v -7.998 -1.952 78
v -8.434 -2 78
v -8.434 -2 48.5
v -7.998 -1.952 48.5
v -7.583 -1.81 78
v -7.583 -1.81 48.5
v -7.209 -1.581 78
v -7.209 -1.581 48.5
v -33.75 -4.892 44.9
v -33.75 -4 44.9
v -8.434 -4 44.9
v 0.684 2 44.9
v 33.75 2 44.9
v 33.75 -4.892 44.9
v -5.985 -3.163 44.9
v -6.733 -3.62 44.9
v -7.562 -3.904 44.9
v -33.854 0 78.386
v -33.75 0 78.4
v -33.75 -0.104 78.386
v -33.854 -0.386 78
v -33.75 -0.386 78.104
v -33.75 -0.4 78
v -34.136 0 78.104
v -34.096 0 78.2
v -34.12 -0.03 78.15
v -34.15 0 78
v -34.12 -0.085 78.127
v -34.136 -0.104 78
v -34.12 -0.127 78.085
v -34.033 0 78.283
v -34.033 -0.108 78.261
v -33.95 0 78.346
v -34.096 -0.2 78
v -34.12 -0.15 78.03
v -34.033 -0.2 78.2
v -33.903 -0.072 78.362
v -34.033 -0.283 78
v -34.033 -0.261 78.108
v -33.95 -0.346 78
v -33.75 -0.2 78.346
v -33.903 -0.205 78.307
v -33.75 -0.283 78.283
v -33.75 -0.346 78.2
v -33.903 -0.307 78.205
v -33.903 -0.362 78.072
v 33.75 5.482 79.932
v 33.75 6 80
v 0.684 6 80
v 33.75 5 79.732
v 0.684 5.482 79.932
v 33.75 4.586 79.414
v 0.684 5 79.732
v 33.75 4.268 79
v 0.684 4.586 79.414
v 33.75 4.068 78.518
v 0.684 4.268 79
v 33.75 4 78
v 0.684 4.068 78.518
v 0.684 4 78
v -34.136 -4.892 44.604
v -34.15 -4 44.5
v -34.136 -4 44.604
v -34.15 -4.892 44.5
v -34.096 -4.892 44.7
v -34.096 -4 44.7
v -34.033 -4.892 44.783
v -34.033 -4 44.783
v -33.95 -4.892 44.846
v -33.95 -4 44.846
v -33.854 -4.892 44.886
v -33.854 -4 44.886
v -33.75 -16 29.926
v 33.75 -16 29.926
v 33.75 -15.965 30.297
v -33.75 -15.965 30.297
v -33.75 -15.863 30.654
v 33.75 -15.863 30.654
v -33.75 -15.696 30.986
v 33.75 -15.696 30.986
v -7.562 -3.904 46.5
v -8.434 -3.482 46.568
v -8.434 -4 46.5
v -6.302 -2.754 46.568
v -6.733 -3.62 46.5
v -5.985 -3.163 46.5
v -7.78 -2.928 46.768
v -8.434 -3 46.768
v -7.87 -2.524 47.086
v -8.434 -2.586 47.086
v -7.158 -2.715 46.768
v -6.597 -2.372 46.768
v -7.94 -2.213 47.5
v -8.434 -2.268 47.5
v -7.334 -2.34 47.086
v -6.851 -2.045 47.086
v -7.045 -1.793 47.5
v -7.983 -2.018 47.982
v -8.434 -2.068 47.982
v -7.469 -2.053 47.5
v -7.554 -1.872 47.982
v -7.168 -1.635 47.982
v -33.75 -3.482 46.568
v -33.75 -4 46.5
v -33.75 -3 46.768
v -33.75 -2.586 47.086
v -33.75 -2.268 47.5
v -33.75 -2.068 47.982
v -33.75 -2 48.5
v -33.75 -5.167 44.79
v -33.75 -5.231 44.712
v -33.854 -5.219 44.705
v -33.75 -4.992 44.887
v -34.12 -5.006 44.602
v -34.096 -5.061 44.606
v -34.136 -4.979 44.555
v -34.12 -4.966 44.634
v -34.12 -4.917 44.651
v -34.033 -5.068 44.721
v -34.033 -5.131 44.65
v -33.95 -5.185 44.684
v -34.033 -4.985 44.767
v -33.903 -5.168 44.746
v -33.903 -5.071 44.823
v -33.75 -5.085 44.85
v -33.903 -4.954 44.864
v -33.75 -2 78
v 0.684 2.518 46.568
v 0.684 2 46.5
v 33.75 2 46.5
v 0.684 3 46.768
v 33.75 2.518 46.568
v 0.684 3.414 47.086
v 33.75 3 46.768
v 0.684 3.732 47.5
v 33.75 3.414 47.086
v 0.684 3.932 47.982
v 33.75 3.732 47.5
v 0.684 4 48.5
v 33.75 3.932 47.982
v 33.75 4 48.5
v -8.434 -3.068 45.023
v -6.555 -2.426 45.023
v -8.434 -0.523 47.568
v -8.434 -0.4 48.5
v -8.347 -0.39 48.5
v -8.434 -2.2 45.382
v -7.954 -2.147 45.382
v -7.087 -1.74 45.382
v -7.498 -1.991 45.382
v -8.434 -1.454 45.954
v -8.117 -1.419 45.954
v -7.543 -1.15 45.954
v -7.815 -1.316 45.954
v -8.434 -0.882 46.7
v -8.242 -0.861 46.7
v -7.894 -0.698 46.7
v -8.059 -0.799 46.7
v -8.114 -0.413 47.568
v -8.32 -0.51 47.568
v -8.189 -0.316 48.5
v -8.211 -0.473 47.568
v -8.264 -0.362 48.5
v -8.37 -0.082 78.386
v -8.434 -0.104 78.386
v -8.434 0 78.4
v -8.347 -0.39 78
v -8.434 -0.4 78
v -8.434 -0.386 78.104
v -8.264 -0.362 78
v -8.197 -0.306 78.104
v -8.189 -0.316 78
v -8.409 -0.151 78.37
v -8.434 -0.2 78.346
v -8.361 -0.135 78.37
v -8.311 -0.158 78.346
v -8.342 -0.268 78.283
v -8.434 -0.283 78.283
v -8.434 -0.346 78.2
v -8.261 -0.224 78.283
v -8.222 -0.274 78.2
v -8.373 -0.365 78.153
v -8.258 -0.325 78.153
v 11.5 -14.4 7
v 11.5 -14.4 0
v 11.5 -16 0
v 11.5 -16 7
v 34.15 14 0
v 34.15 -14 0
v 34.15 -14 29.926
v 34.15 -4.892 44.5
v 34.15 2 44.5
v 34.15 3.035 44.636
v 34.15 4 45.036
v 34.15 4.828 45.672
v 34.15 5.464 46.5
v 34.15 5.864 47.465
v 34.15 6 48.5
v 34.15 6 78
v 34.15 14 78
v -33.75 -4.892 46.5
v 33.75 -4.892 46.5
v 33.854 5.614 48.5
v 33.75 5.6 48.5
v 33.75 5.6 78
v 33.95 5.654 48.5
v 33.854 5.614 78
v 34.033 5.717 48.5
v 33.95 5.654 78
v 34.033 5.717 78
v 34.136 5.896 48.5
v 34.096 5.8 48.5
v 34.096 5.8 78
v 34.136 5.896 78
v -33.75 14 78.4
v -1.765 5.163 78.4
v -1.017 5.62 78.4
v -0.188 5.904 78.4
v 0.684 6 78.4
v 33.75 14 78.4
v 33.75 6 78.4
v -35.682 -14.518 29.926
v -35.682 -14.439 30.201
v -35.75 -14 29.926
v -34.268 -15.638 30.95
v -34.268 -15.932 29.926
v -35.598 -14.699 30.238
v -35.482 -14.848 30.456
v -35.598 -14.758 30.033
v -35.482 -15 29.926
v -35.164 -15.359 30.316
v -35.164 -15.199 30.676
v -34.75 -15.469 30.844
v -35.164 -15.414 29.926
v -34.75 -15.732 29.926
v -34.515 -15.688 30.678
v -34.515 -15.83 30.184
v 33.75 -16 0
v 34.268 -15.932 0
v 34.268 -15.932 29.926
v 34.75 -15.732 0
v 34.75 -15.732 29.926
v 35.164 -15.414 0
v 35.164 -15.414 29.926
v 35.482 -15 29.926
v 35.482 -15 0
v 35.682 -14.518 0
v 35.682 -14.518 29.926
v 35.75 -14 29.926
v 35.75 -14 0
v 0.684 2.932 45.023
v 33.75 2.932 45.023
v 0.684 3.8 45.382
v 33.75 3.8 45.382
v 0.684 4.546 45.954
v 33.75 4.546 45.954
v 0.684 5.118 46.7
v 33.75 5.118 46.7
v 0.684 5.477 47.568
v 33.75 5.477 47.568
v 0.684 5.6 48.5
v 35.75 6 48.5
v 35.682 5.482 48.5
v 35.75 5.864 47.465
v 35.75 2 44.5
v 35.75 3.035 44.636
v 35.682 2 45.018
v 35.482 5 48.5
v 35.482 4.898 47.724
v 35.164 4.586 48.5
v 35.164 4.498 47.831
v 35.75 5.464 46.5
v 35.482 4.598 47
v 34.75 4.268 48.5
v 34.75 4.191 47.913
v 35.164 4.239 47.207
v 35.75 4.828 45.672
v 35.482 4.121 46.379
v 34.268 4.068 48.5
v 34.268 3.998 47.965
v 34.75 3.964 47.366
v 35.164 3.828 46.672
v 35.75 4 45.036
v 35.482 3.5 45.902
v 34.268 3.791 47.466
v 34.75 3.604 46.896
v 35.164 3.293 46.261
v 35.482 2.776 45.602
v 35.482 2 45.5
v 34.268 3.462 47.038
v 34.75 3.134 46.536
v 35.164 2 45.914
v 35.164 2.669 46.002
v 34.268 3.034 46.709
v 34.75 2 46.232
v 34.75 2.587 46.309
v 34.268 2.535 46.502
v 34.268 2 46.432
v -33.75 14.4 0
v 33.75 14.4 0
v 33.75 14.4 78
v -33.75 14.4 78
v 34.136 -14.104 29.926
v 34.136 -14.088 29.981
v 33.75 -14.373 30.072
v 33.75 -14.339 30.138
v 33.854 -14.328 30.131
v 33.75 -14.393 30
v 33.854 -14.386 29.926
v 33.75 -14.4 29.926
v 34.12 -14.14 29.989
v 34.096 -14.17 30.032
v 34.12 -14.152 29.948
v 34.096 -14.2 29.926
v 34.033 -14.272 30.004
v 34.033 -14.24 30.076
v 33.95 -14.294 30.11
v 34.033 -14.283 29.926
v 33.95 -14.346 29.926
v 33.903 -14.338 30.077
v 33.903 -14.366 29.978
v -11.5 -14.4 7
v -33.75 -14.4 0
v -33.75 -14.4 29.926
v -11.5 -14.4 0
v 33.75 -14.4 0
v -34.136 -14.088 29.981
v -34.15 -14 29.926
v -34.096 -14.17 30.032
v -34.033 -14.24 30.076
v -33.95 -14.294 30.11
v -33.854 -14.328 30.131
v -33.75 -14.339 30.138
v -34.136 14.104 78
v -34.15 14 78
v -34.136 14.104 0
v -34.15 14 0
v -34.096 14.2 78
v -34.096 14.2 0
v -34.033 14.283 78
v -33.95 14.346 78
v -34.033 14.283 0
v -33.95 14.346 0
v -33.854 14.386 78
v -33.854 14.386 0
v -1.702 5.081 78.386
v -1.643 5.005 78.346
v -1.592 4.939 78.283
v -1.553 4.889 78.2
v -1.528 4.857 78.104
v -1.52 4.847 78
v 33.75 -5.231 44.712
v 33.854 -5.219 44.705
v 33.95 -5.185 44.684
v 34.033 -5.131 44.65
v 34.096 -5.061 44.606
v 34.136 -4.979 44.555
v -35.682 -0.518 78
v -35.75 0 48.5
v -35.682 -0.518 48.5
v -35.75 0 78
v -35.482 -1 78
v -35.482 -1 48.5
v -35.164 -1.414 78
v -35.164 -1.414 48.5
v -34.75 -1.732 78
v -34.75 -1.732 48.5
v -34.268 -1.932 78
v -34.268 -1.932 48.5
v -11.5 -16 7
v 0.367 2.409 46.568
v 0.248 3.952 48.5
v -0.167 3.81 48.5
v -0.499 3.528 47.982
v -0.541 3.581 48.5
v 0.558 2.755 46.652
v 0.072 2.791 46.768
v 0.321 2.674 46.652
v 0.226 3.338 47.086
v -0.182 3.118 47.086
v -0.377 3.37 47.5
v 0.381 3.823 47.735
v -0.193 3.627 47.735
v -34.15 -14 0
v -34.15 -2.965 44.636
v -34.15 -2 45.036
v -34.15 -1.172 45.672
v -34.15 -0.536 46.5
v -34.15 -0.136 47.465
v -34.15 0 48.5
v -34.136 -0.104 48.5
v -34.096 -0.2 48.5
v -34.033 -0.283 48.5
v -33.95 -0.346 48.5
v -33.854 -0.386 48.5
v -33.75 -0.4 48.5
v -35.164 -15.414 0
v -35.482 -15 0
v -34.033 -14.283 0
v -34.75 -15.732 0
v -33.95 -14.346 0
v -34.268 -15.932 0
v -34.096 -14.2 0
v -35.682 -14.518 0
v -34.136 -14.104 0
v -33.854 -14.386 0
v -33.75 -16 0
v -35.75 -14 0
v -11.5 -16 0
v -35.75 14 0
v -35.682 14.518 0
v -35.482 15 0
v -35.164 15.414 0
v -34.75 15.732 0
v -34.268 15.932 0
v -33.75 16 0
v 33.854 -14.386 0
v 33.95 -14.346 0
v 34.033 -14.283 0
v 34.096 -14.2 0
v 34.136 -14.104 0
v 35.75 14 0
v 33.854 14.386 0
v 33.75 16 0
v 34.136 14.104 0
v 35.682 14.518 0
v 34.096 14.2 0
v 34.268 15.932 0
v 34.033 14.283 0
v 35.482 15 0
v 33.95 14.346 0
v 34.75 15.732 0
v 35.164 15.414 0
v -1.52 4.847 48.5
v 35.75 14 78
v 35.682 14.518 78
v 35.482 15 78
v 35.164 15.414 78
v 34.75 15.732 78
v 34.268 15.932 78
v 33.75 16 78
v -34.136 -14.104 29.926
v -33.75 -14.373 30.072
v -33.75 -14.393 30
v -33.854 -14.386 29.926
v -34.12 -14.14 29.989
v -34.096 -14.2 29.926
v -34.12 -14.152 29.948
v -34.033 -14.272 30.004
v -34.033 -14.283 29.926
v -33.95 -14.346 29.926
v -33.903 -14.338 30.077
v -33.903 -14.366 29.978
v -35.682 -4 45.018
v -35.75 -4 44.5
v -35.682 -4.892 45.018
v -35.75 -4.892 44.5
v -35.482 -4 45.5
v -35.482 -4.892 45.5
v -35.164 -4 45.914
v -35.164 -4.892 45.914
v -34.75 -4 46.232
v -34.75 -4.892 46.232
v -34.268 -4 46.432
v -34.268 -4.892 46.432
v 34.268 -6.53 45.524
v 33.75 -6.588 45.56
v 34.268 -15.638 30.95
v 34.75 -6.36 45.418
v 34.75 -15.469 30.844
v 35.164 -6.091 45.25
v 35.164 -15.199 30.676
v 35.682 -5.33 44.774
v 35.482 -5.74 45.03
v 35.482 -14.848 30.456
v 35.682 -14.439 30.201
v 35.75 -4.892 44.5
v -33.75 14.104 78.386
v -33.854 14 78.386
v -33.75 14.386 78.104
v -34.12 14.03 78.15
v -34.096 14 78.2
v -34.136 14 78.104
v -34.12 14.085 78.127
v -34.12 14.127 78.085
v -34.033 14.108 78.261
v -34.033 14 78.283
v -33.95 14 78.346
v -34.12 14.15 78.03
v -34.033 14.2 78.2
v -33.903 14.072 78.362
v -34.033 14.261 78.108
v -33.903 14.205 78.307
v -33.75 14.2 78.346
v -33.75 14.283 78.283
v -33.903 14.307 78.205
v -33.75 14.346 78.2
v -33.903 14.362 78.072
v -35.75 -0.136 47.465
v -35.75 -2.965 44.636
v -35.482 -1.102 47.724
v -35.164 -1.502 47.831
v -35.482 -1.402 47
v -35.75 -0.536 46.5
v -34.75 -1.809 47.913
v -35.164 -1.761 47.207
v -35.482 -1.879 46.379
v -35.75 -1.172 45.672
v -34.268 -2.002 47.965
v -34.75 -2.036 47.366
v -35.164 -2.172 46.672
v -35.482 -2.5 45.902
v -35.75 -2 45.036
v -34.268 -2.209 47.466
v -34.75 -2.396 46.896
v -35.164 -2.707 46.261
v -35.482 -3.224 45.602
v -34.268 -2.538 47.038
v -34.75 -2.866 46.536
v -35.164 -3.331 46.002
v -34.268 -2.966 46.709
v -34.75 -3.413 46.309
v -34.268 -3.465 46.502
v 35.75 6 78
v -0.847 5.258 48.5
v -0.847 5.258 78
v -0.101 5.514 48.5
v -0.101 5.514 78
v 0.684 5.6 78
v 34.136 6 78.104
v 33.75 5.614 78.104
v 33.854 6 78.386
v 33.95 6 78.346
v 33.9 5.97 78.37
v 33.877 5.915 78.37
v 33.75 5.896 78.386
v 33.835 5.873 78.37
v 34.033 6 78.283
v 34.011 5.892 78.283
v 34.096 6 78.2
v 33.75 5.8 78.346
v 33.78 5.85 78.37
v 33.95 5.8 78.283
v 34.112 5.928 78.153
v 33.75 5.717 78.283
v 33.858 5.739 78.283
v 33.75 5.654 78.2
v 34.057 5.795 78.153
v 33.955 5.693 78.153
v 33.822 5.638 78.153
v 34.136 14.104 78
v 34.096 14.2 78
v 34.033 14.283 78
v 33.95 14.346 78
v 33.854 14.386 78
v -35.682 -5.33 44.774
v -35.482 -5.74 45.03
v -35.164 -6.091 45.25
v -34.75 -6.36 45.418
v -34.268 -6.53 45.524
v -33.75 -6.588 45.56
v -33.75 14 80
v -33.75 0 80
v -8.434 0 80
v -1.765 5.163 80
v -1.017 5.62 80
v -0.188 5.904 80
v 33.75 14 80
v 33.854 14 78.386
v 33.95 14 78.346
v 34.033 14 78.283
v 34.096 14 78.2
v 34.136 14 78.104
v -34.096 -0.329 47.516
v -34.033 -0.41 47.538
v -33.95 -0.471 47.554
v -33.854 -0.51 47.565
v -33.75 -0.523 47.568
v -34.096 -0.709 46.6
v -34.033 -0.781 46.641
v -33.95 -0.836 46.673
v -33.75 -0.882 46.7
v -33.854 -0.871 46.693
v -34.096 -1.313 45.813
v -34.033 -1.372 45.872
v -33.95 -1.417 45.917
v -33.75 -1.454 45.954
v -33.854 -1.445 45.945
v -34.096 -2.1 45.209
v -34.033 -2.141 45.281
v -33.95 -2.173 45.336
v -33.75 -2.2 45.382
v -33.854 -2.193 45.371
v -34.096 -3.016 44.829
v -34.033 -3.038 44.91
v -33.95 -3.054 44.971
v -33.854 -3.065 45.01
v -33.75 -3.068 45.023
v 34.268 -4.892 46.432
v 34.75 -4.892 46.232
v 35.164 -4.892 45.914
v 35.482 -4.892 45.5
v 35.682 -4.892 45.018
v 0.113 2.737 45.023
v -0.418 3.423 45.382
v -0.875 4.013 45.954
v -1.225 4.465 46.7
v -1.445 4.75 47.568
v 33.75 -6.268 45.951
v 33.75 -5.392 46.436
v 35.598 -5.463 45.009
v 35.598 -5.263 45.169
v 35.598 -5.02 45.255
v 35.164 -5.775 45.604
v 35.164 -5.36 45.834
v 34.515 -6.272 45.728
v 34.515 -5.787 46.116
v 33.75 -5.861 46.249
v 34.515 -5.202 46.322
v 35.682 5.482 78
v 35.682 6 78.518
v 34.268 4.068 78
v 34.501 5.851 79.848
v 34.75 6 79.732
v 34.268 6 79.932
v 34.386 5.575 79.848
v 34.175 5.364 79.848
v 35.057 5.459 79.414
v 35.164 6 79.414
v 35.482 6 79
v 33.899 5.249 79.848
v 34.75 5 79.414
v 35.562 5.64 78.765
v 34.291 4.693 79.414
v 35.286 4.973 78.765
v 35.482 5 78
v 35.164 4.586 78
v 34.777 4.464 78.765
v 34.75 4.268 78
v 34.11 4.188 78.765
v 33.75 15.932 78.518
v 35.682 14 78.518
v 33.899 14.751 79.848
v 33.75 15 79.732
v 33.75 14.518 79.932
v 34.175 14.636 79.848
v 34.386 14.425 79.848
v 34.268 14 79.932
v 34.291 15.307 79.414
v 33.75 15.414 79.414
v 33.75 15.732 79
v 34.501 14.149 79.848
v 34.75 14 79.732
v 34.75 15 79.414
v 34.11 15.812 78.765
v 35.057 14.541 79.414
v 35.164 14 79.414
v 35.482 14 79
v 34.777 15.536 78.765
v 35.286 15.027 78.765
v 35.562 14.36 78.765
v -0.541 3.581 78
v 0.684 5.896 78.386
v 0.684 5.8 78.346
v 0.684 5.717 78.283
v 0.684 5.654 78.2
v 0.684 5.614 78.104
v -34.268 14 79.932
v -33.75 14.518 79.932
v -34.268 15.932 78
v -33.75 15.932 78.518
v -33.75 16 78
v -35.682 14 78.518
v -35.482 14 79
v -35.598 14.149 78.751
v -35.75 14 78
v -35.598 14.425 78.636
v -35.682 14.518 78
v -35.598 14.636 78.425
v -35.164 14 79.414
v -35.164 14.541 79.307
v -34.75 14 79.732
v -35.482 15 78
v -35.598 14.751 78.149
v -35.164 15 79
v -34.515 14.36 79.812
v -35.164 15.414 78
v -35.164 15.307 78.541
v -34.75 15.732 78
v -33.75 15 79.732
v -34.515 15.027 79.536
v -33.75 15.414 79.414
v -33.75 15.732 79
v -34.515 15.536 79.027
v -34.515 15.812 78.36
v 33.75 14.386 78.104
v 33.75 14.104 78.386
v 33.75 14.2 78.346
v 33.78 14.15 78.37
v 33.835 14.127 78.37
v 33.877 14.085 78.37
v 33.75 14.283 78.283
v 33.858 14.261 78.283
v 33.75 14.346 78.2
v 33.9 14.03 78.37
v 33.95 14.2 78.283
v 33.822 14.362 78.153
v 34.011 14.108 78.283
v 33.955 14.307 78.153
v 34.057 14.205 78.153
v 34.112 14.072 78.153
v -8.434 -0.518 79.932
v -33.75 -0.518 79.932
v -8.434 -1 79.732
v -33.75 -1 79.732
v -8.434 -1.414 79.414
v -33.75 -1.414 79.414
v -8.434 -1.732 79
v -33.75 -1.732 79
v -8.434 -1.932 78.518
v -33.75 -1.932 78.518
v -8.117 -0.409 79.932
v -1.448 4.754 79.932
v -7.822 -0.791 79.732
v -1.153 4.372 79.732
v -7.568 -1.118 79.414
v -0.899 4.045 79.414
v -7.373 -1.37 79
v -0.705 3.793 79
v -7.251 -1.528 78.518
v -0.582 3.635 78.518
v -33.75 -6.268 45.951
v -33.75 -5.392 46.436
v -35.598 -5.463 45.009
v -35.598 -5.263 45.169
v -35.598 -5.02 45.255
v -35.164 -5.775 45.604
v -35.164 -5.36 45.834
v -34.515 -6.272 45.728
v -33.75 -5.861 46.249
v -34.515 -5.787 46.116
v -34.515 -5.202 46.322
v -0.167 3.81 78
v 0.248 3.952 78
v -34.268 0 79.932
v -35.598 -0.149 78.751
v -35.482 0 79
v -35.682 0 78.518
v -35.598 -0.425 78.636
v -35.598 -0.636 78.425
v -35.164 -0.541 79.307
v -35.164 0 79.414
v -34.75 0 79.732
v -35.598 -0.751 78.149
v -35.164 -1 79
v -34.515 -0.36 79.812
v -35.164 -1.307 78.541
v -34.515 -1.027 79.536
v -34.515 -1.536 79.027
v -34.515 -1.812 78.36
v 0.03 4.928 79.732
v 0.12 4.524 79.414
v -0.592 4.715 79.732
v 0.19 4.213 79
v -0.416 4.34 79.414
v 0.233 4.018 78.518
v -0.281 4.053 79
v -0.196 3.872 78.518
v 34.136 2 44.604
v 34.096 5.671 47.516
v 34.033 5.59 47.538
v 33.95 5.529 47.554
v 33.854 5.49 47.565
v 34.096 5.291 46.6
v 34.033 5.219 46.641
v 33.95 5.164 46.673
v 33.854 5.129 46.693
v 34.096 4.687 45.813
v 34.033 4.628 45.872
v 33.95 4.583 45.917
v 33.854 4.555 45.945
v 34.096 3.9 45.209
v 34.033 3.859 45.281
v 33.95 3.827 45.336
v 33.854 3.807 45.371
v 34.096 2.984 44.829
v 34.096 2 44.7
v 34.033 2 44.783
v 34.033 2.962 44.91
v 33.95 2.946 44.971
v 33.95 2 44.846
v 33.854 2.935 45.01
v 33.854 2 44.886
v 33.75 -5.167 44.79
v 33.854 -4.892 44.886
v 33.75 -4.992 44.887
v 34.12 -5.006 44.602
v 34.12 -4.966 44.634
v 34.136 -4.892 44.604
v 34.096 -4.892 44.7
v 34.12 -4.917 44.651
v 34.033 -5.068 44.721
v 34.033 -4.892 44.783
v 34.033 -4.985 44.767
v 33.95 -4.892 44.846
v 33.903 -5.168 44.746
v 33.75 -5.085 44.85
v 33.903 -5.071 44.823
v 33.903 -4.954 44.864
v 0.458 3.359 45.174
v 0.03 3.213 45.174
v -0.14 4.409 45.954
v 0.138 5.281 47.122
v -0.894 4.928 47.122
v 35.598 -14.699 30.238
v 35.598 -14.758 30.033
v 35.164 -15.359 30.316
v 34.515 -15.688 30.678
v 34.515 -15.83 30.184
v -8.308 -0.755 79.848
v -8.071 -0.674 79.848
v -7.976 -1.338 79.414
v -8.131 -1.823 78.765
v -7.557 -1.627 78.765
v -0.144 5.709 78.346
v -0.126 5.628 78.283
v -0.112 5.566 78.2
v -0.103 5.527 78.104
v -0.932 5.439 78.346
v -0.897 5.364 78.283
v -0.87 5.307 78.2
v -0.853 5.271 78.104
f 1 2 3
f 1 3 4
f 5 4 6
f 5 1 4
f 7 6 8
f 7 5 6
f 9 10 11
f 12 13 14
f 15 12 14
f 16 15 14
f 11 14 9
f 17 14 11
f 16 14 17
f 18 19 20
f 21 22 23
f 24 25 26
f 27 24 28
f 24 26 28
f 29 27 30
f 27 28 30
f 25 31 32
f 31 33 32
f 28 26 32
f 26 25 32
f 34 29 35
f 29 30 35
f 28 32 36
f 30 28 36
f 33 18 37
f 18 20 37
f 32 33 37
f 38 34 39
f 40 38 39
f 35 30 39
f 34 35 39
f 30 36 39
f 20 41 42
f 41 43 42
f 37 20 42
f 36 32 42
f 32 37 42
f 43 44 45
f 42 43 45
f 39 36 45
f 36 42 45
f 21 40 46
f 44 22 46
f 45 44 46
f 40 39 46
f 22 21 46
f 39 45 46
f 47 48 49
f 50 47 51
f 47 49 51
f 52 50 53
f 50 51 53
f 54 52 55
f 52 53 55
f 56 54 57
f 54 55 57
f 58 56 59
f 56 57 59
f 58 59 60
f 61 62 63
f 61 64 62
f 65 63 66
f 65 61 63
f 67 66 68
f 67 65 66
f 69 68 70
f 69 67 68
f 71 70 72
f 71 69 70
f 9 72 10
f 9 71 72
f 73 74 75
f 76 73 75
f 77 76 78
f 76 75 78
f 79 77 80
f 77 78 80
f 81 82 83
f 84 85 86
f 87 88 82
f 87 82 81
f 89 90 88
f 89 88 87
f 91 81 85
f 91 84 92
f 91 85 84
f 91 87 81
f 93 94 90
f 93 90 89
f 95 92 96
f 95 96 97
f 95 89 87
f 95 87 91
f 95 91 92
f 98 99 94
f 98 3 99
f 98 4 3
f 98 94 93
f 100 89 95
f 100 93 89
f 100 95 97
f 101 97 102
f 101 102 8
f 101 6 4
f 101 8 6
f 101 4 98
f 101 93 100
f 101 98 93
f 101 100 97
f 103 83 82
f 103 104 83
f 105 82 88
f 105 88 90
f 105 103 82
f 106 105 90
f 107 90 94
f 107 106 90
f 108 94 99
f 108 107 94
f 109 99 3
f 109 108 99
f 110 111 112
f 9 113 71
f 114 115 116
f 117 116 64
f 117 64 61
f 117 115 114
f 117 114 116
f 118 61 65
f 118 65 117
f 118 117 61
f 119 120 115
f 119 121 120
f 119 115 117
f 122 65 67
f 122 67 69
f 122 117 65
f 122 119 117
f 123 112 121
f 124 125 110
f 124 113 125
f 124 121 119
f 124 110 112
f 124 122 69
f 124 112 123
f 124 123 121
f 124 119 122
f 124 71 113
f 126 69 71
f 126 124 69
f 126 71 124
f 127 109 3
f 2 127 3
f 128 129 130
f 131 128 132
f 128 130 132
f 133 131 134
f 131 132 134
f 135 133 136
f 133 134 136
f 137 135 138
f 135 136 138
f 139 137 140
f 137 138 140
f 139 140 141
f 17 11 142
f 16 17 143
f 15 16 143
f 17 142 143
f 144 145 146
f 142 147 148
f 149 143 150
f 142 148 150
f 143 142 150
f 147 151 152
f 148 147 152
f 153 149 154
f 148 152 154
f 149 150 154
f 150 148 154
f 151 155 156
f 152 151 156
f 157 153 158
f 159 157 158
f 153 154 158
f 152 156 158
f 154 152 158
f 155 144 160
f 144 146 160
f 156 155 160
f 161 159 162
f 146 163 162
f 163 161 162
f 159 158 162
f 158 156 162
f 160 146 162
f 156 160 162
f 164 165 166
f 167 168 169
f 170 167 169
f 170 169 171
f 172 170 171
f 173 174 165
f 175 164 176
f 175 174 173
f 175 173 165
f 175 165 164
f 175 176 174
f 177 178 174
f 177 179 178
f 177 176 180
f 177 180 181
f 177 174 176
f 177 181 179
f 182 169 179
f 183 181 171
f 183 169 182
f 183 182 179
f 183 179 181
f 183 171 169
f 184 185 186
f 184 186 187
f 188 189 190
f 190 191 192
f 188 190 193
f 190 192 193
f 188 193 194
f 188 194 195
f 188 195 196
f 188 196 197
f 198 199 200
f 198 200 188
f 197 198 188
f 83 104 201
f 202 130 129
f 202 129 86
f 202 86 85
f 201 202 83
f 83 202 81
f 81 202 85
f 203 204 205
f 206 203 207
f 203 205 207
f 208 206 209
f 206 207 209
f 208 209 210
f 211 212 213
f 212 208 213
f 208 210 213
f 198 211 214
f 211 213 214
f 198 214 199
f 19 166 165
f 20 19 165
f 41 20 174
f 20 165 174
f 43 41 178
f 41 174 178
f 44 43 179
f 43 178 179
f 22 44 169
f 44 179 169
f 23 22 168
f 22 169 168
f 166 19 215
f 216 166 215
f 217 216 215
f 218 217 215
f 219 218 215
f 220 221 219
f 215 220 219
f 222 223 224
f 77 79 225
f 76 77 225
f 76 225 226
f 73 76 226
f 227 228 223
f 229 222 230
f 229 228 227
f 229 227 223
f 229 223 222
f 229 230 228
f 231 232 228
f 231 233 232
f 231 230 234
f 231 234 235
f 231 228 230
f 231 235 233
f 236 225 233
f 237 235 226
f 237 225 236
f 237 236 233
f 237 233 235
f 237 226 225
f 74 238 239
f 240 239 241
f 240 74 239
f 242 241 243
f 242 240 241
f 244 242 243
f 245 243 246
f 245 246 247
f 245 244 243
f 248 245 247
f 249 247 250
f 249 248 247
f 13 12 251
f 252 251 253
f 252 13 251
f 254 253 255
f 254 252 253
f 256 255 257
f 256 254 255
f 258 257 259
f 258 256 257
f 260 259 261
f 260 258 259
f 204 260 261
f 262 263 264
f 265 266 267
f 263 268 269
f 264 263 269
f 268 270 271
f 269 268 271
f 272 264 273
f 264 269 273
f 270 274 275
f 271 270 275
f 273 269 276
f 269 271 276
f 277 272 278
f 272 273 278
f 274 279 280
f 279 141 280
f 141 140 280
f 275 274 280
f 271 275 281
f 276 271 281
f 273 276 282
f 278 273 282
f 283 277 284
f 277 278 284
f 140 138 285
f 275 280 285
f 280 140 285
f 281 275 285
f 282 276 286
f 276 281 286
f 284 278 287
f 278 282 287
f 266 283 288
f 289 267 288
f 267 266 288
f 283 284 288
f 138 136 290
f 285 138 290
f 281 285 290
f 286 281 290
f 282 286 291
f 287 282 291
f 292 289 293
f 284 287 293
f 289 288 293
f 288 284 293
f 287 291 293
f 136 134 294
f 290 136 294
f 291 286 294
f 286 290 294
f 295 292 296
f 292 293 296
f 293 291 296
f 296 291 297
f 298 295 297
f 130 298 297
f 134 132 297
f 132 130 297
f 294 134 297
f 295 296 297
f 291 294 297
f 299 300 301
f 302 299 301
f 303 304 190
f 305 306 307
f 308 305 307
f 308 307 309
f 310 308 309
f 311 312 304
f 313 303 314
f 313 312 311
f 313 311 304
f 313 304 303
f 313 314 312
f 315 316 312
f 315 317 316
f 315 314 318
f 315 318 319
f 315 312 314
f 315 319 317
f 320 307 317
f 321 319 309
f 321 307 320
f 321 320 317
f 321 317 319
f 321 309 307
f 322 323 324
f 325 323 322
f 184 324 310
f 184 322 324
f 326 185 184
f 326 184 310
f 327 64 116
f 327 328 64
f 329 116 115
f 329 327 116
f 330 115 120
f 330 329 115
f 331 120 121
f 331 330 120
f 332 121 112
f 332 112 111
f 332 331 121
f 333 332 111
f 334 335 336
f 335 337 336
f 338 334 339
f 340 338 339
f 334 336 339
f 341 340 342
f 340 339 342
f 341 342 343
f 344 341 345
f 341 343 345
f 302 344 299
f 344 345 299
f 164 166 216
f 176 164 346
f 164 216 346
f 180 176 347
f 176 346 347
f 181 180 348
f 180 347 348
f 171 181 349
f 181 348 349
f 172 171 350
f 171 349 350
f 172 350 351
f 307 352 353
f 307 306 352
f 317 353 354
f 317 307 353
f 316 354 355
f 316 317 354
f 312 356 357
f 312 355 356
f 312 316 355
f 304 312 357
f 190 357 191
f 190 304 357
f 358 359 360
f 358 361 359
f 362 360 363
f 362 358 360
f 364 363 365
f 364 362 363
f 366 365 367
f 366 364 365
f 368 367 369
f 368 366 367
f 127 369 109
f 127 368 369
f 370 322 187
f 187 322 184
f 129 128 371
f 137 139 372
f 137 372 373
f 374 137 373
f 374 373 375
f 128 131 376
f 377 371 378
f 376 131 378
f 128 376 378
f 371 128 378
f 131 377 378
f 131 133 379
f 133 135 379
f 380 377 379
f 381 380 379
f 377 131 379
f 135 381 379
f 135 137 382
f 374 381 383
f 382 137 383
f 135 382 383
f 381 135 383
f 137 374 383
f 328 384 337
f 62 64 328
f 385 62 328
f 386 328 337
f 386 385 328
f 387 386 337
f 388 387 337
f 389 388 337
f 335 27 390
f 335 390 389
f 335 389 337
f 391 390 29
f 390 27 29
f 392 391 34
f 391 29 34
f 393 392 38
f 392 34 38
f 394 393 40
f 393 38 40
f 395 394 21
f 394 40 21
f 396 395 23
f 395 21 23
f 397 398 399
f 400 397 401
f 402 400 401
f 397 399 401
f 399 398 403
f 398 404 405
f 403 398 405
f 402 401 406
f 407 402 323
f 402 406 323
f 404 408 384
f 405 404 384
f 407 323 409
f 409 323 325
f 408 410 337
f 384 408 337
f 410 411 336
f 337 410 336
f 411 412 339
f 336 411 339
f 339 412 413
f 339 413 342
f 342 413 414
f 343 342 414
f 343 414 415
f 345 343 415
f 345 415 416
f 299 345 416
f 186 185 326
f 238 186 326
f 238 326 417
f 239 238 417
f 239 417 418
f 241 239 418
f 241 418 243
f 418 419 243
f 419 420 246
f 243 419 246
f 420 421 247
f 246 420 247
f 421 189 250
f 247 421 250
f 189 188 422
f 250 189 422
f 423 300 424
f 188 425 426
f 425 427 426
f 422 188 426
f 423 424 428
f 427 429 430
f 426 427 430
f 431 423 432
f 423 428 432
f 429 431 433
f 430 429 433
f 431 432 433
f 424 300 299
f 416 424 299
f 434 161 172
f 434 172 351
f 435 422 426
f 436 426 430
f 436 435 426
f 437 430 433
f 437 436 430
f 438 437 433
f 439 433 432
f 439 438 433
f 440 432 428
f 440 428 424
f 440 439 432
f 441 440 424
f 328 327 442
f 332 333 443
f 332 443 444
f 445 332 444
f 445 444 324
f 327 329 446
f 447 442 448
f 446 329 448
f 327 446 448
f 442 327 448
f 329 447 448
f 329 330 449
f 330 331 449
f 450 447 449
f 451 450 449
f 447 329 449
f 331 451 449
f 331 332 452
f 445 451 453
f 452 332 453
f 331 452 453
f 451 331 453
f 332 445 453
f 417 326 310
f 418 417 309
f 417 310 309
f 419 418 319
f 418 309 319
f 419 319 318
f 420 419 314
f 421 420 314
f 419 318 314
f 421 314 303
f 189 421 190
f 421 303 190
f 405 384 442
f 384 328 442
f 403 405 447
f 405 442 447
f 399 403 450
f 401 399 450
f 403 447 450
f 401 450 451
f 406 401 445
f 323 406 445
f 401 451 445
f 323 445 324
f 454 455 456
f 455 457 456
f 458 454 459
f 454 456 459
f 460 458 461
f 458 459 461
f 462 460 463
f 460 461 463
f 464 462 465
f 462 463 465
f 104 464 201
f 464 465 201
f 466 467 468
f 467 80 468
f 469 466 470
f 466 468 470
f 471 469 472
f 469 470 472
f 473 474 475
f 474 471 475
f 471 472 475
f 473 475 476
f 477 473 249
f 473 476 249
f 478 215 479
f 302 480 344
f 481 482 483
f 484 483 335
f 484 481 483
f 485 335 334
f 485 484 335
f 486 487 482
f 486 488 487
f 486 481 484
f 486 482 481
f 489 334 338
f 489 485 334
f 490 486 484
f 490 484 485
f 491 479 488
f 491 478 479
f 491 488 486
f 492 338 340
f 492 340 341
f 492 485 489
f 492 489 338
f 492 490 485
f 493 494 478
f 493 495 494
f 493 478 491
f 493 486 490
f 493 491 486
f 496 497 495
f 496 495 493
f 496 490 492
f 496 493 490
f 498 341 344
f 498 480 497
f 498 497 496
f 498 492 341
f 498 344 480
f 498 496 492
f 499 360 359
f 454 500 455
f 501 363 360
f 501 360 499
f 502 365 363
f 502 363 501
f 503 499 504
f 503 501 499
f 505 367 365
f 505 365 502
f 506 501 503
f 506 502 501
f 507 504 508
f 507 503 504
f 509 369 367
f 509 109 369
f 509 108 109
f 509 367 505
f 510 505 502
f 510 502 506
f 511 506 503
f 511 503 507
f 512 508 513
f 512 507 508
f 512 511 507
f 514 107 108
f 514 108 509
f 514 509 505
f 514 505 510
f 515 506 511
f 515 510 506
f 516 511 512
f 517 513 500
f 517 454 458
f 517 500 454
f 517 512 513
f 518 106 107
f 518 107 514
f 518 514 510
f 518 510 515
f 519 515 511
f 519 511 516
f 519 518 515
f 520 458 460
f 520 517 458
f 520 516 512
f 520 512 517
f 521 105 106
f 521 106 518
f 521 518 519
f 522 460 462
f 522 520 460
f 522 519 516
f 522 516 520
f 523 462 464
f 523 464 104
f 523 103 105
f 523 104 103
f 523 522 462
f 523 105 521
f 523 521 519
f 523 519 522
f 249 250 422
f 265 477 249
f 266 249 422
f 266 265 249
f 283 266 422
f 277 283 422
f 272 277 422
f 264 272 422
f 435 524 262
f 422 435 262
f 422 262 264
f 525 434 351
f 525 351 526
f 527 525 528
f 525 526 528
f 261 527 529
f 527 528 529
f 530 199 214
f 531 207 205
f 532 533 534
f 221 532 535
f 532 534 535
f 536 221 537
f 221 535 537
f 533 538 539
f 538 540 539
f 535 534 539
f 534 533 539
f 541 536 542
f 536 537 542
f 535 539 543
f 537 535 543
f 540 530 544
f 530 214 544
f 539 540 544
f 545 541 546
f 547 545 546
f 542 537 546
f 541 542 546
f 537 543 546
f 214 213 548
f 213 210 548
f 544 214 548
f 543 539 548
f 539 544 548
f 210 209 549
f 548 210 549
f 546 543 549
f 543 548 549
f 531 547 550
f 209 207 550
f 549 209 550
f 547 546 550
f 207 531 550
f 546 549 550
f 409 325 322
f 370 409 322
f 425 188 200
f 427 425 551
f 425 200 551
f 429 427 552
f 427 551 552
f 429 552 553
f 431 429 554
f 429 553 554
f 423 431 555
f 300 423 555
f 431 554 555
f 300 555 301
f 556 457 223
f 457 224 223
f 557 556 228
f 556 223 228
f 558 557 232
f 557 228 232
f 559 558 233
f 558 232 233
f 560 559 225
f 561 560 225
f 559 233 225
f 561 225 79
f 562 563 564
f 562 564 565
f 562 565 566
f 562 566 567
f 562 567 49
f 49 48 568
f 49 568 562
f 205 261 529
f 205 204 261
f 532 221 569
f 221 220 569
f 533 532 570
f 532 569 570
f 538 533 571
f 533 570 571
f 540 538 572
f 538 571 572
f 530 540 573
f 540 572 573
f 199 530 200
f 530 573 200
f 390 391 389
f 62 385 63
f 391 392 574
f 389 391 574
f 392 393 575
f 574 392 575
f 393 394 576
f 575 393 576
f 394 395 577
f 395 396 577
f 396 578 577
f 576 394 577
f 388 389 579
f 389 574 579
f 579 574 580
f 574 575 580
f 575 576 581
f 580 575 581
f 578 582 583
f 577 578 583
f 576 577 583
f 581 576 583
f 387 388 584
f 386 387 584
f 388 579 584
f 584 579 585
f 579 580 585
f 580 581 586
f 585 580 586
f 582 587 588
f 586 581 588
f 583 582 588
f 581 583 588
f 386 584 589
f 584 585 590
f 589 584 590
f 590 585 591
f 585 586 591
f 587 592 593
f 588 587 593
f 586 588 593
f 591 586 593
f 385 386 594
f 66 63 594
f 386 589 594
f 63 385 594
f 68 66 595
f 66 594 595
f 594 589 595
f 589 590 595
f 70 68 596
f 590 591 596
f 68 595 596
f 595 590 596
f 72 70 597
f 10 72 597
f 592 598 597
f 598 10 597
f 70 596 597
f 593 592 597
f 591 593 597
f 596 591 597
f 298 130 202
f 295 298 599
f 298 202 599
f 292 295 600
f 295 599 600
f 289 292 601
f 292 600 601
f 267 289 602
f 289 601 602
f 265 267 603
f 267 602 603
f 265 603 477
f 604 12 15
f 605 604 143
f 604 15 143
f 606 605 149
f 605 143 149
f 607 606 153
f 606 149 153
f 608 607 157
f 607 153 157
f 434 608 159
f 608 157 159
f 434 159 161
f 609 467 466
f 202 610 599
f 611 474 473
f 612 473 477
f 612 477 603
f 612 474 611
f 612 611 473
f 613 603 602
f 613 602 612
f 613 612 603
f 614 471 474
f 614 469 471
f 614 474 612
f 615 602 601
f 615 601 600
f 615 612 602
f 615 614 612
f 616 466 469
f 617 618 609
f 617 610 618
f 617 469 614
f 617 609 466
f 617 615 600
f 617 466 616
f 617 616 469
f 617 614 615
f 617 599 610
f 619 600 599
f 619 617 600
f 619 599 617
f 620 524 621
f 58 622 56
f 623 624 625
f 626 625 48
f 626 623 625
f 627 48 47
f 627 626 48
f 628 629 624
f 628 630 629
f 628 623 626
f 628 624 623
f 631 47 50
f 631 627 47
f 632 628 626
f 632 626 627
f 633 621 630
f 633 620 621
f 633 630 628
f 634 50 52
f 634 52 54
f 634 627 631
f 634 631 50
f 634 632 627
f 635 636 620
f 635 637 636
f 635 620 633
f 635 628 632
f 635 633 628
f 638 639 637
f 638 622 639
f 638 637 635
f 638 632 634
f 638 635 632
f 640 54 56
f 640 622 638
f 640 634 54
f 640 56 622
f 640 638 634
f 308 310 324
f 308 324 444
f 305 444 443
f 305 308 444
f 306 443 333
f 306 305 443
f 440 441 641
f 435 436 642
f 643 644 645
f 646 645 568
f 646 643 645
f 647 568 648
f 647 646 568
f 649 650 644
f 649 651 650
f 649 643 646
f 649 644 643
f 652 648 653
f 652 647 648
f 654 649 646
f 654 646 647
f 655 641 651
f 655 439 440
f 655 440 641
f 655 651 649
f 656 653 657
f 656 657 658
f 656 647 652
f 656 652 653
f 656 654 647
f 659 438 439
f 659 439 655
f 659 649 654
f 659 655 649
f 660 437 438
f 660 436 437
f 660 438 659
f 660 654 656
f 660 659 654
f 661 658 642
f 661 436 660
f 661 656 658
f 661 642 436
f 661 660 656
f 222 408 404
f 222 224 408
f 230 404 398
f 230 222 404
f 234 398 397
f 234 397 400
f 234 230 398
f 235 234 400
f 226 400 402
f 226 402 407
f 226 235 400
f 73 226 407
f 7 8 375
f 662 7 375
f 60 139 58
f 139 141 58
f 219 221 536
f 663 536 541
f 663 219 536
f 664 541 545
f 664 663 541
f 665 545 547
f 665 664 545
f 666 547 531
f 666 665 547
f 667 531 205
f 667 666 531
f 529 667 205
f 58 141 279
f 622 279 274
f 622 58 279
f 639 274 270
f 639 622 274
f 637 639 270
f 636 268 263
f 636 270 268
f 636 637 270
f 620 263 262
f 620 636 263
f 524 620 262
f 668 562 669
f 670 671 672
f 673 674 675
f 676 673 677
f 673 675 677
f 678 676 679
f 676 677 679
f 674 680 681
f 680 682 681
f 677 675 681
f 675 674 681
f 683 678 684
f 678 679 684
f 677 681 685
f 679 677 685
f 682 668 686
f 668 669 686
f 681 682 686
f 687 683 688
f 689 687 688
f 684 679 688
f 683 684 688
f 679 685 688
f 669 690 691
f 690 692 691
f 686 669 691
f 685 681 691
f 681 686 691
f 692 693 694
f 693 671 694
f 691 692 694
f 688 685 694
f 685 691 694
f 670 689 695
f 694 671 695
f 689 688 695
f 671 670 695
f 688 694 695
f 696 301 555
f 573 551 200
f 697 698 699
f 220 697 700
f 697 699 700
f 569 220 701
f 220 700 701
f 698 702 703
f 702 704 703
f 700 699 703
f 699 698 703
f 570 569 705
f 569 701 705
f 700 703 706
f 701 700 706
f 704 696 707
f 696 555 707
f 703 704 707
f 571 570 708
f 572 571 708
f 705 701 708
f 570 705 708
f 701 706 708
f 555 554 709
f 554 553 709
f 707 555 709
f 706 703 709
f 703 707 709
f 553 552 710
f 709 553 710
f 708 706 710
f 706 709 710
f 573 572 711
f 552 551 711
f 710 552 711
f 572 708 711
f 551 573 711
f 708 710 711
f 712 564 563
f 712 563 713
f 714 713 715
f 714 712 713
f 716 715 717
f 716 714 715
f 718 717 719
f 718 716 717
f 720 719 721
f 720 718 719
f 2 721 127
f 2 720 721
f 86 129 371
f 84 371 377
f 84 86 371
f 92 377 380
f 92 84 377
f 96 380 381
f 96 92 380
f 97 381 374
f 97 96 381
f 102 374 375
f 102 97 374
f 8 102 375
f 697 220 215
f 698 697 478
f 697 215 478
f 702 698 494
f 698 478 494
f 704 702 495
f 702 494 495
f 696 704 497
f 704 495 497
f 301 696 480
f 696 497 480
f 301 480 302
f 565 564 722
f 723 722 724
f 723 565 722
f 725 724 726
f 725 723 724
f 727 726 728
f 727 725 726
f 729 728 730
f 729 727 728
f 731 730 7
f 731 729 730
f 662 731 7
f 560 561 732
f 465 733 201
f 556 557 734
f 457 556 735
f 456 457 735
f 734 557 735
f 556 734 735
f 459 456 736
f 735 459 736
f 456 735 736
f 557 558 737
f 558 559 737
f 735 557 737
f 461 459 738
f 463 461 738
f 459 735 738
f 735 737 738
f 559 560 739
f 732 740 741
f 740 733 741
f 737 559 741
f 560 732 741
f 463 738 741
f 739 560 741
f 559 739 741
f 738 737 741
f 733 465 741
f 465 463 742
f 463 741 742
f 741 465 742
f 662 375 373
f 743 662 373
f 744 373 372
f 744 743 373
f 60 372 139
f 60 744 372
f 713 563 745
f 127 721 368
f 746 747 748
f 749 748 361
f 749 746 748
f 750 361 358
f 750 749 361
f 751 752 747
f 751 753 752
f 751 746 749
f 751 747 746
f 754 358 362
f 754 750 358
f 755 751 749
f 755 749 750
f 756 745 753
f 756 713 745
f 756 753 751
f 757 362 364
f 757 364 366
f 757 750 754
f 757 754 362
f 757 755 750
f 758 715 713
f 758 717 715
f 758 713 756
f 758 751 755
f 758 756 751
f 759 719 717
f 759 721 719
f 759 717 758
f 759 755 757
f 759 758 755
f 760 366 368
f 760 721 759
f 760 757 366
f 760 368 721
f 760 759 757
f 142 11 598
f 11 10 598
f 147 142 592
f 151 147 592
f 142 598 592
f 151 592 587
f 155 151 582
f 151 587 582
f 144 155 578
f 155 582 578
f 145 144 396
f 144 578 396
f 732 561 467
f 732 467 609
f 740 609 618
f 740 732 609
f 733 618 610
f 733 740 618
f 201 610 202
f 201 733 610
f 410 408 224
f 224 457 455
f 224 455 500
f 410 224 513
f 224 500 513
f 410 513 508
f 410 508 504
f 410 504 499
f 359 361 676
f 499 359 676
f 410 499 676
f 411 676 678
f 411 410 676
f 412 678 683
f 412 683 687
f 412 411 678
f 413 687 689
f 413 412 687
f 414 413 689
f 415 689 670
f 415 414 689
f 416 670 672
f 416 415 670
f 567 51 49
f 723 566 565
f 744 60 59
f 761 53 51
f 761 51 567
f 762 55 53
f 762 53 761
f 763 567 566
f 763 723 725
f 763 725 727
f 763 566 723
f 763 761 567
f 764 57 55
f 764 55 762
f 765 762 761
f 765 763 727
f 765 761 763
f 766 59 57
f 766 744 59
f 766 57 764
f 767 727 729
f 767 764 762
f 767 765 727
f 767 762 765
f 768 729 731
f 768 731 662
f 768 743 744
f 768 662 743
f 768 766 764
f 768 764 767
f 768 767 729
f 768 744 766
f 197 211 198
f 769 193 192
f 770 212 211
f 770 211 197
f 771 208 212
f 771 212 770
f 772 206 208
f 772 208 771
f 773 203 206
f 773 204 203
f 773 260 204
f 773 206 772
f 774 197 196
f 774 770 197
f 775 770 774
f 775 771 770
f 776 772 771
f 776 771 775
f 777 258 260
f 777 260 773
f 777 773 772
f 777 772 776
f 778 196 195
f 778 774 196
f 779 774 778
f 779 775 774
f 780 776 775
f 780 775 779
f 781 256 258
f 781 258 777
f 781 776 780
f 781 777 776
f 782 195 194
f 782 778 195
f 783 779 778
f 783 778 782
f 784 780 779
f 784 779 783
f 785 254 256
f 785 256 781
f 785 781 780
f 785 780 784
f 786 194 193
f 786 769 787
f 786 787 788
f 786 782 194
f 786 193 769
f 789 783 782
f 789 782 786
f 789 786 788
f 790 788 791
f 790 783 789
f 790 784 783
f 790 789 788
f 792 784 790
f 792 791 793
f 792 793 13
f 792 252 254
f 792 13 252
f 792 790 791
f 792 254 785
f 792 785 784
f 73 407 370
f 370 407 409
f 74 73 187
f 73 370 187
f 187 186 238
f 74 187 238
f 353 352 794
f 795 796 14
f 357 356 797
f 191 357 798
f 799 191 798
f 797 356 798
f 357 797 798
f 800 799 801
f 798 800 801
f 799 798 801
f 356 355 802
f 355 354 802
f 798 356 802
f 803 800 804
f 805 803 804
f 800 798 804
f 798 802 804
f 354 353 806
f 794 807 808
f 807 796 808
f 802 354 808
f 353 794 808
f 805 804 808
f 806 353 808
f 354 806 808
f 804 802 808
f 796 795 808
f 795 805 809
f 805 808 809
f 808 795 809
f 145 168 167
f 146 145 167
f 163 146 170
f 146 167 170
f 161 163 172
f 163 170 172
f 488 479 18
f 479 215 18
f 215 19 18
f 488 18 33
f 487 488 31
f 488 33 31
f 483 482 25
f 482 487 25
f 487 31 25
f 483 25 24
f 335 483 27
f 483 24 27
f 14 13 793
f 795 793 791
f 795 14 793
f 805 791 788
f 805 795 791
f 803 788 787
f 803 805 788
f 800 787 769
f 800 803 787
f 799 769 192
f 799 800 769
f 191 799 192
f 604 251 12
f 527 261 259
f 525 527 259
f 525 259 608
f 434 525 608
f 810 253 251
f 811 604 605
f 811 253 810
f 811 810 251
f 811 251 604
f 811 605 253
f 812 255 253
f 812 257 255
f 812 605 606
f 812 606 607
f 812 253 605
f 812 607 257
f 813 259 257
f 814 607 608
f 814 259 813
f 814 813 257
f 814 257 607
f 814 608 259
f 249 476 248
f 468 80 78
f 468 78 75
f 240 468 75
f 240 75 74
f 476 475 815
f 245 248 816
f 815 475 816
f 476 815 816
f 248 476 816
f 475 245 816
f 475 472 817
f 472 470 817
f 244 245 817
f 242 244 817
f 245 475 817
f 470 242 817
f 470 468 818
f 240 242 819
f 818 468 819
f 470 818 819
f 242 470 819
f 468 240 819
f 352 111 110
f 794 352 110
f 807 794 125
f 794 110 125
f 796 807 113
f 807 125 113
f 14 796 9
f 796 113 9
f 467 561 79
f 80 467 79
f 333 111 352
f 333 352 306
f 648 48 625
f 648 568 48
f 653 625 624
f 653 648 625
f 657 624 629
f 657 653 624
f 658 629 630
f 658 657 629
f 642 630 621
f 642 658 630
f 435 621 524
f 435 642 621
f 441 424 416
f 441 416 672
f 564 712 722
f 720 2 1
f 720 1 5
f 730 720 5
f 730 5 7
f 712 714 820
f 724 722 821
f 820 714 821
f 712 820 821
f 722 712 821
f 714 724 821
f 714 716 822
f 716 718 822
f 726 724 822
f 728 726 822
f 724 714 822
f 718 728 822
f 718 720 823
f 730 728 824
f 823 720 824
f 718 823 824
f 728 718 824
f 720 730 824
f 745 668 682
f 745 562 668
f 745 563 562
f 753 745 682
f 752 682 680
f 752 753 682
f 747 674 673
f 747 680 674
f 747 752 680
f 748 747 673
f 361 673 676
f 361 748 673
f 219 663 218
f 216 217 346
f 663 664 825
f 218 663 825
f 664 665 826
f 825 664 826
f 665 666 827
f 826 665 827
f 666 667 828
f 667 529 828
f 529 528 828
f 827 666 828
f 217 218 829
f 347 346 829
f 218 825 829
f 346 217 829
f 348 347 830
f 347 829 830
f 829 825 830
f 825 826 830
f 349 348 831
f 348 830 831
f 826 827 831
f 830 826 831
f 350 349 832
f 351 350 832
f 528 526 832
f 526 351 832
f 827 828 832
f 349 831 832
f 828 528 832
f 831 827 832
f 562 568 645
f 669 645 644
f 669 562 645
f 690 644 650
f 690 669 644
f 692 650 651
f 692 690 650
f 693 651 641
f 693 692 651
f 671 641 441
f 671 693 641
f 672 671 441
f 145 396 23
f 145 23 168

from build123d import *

# Parameters (mm, degrees)
F0_W      = 71.5
F0_H      = 32
F1_DEPTH  = 30.5
F3_DEPTH  = 35.75
F4_W      = 12
F4_H      = 33.5
F5_DEPTH  = 35.75
F7_DEPTH  = 80
F8_R      = 2
F9_T      = -1.6
F10_W     = 23
F10_H     = 14
F11_DEPTH = 25


with BuildPart() as f1:
    # F0 (on Top) → F1 (new body)
    with BuildSketch(Plane.XY):
        Rectangle(F0_W, F0_H)
    extrude(amount=F1_DEPTH)

    # F2 (on Right) → F3 (join, symmetric)
    with BuildSketch(Plane.YZ):
        Polygon((-16, 30.5), (0, 30.5), (16, 30.5), (16, 46.5), (-6, 46.5), align=None)
    extrude(amount=F3_DEPTH, both=True)

    # F4 (on Right) → F5 (join, symmetric)
    with BuildSketch(Plane.YZ):
        with Locations((10, 63.25)):
            Rectangle(F4_W, F4_H)
    extrude(amount=F5_DEPTH, both=True)

    # F6 (on Top) → F7 (join)
    with BuildSketch(Plane.XY):
        Polygon((-7.75, -2), (0, 4), (0, 16), (-35.75, 16), (-35.75, -2), align=None)
    extrude(amount=F7_DEPTH)

    # F8
    f8_edges = [f1.edges().sort_by_distance(p)[0] for p in [
        (0, 4, 63.25),
        (-7.75, -2, 63.25),
        (17.875, 4, 46.5),
        (0, -6, 46.5),
        (0, -16, 30.5),
        (35.75, 4, 63.25),
        (35.75, 16, 40),
        (0, 16, 80),
        (35.75, 10, 80),
        (17.875, 4, 80),
        (-21.75, -2, 80),
        (-35.75, 7, 80),
        (-35.75, -2, 63.25),
        (-35.75, 16, 40),
        (-35.75, -11, 38.5),
        (-35.75, -16, 15.25),
        (-35.75, -4, 46.5),
        (35.75, -11, 38.5),
        (35.75, -16, 15.25),
        (-21.75, -2, 46.5),
        (35.75, -1, 46.5),
        (-3.875, 1, 46.5),
        (-3.875, 1, 80),
    ]]
    fillet(f8_edges, radius=F8_R)

    # F9
    f9_openings = [f1.faces().sort_by_distance(p)[0] for p in [
        (0, 0, 0),
    ]]
    offset(amount=F9_T, openings=f9_openings)


with BuildPart() as f11:
    # F10 (on Front) → F11 (new body)
    with BuildSketch(Plane.XZ):
        Rectangle(F10_W, F10_H)
    extrude(amount=F11_DEPTH)


with BuildPart() as f1_1:
    add(f1.part)

    # F12: cut F11
    add(f11.part, mode=Mode.SUBTRACT)


solid = f1_1.part
